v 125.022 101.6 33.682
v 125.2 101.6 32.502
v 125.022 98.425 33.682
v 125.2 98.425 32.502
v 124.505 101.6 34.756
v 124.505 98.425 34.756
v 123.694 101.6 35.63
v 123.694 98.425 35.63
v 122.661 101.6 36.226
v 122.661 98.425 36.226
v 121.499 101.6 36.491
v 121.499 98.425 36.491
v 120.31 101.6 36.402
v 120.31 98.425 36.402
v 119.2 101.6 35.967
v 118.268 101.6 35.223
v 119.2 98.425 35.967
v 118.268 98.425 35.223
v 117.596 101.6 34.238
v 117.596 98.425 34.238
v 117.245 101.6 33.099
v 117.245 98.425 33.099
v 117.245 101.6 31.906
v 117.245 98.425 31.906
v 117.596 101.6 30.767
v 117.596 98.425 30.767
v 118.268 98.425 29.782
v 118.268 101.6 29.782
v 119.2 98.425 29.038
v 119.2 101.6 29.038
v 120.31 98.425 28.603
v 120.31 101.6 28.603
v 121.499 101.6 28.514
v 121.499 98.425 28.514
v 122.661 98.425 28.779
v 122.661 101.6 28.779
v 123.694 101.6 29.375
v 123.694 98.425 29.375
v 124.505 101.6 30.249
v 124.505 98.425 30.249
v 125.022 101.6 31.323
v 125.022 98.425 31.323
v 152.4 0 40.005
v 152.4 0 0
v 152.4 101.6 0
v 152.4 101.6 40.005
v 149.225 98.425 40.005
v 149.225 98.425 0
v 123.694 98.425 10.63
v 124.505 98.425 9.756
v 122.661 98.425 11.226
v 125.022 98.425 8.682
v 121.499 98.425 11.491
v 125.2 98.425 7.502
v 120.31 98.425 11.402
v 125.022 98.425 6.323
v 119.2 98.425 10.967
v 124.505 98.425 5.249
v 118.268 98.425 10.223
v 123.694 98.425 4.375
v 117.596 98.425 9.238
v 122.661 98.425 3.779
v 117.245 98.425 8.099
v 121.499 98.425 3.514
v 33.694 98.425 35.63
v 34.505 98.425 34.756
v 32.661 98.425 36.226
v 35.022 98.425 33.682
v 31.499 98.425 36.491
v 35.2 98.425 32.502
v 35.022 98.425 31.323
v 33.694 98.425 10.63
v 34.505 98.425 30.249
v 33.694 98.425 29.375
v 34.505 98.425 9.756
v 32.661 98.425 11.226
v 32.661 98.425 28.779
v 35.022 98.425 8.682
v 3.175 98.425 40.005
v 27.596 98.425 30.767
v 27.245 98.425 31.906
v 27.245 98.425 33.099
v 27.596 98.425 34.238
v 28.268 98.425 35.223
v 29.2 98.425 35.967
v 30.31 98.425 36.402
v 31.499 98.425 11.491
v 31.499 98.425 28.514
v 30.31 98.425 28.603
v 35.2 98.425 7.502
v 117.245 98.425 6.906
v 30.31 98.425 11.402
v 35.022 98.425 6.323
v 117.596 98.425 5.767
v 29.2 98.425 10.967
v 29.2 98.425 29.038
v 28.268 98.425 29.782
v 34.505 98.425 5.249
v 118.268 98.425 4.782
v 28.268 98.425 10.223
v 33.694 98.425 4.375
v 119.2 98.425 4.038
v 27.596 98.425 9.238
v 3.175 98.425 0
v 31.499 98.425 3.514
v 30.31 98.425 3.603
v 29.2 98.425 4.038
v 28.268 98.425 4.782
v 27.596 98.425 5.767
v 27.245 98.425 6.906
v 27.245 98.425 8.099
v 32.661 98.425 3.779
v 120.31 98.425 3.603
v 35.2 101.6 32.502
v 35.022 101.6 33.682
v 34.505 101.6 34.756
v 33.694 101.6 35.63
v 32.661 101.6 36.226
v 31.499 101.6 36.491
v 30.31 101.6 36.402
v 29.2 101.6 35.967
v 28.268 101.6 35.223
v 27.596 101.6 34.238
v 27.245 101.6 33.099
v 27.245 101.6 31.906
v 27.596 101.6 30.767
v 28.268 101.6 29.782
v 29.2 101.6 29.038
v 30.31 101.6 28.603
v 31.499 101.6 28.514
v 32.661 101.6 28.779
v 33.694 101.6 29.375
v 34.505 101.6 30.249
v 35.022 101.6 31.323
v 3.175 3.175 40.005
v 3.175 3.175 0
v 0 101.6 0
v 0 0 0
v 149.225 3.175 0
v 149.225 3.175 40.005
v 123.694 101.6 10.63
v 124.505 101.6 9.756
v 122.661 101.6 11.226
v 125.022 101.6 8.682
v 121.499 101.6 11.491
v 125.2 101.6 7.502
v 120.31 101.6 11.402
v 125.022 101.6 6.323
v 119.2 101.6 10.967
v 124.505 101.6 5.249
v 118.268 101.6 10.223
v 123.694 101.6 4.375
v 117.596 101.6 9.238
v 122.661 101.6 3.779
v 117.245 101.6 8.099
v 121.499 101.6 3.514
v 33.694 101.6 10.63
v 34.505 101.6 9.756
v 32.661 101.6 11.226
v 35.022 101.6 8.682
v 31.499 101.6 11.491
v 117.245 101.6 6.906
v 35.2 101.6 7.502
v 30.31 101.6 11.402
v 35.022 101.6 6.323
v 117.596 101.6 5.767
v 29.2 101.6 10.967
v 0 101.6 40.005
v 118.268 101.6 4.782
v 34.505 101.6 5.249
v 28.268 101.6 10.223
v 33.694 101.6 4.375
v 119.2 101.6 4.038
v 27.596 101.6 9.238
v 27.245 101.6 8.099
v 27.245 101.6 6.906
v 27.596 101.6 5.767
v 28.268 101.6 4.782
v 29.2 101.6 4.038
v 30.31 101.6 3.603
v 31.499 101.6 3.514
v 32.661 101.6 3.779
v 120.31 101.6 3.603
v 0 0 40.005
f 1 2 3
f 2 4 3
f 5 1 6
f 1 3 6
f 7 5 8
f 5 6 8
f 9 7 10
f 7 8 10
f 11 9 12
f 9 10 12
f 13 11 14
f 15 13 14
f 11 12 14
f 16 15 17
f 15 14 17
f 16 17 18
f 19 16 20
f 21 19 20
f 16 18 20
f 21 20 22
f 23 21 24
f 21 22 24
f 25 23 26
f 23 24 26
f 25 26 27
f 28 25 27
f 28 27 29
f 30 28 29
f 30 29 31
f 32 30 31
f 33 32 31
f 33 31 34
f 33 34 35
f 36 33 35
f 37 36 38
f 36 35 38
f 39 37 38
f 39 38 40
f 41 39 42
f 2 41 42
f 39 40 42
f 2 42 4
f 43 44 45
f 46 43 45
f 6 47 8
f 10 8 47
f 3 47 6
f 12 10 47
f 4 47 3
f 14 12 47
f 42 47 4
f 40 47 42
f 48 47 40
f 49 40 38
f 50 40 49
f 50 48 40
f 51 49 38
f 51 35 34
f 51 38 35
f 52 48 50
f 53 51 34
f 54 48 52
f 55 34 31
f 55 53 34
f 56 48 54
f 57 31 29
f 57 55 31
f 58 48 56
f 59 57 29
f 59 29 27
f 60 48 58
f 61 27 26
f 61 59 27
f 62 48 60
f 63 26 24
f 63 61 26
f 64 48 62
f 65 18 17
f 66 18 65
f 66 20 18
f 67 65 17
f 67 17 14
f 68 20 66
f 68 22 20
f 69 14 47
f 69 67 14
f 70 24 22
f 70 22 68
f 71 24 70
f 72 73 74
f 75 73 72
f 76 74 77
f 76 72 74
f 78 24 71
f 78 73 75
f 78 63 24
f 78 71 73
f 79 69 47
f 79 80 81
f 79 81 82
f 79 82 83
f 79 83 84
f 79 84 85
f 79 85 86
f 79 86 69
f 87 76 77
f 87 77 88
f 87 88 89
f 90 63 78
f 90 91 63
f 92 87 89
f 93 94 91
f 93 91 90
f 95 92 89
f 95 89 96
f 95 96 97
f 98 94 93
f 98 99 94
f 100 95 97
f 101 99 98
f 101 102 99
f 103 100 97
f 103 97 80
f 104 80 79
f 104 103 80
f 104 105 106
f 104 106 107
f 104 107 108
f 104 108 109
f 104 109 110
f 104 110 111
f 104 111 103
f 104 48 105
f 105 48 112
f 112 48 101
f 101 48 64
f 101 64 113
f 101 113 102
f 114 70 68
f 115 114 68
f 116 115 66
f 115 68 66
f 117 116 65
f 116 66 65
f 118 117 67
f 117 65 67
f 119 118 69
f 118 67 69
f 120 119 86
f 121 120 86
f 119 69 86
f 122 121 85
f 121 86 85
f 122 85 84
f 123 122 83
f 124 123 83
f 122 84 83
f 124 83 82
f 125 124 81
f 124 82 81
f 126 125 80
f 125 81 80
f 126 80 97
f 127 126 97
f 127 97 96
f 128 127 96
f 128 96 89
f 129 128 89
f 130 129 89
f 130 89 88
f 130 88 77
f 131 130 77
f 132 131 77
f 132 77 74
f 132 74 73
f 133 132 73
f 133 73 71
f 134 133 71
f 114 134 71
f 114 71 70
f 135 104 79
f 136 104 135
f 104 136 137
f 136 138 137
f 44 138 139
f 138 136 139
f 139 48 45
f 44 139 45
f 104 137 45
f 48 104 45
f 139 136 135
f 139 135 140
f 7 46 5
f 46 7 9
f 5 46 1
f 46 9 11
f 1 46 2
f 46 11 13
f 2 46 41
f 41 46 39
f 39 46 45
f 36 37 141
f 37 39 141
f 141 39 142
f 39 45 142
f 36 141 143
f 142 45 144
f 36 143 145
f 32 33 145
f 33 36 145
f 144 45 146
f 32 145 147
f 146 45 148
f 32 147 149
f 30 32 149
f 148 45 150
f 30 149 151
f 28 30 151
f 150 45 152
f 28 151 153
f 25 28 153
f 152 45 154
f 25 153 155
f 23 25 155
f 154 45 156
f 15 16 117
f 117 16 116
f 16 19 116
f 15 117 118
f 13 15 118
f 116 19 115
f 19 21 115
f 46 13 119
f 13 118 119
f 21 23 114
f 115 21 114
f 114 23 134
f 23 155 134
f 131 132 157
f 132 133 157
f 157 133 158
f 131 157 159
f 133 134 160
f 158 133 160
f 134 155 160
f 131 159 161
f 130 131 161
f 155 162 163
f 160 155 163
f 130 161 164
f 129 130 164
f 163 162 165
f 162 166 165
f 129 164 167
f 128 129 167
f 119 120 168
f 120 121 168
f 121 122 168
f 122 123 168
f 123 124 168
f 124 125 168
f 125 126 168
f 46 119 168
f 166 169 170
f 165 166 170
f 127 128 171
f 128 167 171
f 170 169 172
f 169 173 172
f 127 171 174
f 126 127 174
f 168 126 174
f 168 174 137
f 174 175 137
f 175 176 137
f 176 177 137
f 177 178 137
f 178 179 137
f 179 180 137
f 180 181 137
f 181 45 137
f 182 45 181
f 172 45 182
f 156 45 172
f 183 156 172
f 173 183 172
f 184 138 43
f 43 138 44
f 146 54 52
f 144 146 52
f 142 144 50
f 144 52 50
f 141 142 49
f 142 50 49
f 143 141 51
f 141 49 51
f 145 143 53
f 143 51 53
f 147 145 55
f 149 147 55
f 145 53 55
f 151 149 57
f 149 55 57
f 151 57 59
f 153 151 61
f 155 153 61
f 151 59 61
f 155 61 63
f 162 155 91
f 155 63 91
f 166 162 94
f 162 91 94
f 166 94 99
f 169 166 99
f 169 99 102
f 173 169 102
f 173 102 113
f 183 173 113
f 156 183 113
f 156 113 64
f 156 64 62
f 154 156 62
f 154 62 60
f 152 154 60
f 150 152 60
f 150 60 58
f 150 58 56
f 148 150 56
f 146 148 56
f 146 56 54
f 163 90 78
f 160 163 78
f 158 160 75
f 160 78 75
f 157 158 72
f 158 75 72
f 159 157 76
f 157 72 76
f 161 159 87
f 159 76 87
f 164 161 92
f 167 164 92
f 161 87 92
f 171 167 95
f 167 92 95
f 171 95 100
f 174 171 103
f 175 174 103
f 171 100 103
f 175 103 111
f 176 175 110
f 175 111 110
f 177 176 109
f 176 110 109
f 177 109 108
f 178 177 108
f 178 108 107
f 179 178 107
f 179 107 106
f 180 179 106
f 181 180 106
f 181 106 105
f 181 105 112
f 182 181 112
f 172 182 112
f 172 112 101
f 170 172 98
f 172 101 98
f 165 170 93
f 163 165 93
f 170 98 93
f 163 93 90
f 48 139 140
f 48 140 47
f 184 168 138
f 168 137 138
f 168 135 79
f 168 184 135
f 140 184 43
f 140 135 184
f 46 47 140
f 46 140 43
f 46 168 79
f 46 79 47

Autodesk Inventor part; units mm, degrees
ref_plane "YZ Plane" through (0, 0, 0) normal (1, 0, 0) x (0, 1, 0)
ref_plane "XZ Plane" through (0, 0, 0) normal (0, 1, 0) x (-1, 0, 0)
ref_plane "XY Plane" through (0, 0, 0) normal (0, 0, 1) x (1, 0, 0)
sketch "Sketch1" plane through (0, 0, 0) normal (0, 0, 1) x (1, 0, 0)
  line L0 (0, 0) -> (152.4, 0)
  line L1 (152.4, 0) -> (152.4, 101.6)
  line L2 (152.4, 101.6) -> (0, 101.6)
  line L3 (0, 101.6) -> (0, 0)
  dimension "d0" = 152.4
  dimension "d1" = 101.6
extrude "Extrusion1" add sketch "Sketch1" along normal blind 40.005
shell "Shell1" thickness 3.175 removed faces 2 at (50.8, 67.7333, 0) at (50.8, 67.7333, 40.005)
sketch "Sketch2" plane through (3.175, 98.425, 0) normal (0, -1, 0) x (1, 0, 0)
  circle A0 centre (118.025, 7.5025) radius 4
  circle A1 centre (28.025, 7.5025) radius 4
  line L0 (-3.175, 0) -> (-3.175, 40.005) construction
  line L1 (-3.175, 0) -> (149.225, 0) construction
  circle A2 centre (118.025, 32.5025) radius 4
  circle A3 centre (28.025, 32.5025) radius 4
  line L2 (118.025, 7.5025) -> (28.025, 7.5025) construction
  line L3 (28.025, 7.5025) -> (28.025, 32.5025)
  line L4 (28.025, 32.5025) -> (118.025, 32.5025) construction
  line L5 (118.025, 32.5025) -> (118.025, 7.5025) construction
  point P0 (73.025, 7.5025)
  point P1 (73.025, 0)
  point P2 (28.025, 20.0025)
  point P3 (-3.175, 20.0025)
  dimension "d5" = 8
  dimension "d6" = 25
  dimension "d7" = 90
extrude "Extrusion2" cut sketch "Sketch2" against normal up to surface (3.175 mm away)
properties part number "YGANTRYTUBE"
